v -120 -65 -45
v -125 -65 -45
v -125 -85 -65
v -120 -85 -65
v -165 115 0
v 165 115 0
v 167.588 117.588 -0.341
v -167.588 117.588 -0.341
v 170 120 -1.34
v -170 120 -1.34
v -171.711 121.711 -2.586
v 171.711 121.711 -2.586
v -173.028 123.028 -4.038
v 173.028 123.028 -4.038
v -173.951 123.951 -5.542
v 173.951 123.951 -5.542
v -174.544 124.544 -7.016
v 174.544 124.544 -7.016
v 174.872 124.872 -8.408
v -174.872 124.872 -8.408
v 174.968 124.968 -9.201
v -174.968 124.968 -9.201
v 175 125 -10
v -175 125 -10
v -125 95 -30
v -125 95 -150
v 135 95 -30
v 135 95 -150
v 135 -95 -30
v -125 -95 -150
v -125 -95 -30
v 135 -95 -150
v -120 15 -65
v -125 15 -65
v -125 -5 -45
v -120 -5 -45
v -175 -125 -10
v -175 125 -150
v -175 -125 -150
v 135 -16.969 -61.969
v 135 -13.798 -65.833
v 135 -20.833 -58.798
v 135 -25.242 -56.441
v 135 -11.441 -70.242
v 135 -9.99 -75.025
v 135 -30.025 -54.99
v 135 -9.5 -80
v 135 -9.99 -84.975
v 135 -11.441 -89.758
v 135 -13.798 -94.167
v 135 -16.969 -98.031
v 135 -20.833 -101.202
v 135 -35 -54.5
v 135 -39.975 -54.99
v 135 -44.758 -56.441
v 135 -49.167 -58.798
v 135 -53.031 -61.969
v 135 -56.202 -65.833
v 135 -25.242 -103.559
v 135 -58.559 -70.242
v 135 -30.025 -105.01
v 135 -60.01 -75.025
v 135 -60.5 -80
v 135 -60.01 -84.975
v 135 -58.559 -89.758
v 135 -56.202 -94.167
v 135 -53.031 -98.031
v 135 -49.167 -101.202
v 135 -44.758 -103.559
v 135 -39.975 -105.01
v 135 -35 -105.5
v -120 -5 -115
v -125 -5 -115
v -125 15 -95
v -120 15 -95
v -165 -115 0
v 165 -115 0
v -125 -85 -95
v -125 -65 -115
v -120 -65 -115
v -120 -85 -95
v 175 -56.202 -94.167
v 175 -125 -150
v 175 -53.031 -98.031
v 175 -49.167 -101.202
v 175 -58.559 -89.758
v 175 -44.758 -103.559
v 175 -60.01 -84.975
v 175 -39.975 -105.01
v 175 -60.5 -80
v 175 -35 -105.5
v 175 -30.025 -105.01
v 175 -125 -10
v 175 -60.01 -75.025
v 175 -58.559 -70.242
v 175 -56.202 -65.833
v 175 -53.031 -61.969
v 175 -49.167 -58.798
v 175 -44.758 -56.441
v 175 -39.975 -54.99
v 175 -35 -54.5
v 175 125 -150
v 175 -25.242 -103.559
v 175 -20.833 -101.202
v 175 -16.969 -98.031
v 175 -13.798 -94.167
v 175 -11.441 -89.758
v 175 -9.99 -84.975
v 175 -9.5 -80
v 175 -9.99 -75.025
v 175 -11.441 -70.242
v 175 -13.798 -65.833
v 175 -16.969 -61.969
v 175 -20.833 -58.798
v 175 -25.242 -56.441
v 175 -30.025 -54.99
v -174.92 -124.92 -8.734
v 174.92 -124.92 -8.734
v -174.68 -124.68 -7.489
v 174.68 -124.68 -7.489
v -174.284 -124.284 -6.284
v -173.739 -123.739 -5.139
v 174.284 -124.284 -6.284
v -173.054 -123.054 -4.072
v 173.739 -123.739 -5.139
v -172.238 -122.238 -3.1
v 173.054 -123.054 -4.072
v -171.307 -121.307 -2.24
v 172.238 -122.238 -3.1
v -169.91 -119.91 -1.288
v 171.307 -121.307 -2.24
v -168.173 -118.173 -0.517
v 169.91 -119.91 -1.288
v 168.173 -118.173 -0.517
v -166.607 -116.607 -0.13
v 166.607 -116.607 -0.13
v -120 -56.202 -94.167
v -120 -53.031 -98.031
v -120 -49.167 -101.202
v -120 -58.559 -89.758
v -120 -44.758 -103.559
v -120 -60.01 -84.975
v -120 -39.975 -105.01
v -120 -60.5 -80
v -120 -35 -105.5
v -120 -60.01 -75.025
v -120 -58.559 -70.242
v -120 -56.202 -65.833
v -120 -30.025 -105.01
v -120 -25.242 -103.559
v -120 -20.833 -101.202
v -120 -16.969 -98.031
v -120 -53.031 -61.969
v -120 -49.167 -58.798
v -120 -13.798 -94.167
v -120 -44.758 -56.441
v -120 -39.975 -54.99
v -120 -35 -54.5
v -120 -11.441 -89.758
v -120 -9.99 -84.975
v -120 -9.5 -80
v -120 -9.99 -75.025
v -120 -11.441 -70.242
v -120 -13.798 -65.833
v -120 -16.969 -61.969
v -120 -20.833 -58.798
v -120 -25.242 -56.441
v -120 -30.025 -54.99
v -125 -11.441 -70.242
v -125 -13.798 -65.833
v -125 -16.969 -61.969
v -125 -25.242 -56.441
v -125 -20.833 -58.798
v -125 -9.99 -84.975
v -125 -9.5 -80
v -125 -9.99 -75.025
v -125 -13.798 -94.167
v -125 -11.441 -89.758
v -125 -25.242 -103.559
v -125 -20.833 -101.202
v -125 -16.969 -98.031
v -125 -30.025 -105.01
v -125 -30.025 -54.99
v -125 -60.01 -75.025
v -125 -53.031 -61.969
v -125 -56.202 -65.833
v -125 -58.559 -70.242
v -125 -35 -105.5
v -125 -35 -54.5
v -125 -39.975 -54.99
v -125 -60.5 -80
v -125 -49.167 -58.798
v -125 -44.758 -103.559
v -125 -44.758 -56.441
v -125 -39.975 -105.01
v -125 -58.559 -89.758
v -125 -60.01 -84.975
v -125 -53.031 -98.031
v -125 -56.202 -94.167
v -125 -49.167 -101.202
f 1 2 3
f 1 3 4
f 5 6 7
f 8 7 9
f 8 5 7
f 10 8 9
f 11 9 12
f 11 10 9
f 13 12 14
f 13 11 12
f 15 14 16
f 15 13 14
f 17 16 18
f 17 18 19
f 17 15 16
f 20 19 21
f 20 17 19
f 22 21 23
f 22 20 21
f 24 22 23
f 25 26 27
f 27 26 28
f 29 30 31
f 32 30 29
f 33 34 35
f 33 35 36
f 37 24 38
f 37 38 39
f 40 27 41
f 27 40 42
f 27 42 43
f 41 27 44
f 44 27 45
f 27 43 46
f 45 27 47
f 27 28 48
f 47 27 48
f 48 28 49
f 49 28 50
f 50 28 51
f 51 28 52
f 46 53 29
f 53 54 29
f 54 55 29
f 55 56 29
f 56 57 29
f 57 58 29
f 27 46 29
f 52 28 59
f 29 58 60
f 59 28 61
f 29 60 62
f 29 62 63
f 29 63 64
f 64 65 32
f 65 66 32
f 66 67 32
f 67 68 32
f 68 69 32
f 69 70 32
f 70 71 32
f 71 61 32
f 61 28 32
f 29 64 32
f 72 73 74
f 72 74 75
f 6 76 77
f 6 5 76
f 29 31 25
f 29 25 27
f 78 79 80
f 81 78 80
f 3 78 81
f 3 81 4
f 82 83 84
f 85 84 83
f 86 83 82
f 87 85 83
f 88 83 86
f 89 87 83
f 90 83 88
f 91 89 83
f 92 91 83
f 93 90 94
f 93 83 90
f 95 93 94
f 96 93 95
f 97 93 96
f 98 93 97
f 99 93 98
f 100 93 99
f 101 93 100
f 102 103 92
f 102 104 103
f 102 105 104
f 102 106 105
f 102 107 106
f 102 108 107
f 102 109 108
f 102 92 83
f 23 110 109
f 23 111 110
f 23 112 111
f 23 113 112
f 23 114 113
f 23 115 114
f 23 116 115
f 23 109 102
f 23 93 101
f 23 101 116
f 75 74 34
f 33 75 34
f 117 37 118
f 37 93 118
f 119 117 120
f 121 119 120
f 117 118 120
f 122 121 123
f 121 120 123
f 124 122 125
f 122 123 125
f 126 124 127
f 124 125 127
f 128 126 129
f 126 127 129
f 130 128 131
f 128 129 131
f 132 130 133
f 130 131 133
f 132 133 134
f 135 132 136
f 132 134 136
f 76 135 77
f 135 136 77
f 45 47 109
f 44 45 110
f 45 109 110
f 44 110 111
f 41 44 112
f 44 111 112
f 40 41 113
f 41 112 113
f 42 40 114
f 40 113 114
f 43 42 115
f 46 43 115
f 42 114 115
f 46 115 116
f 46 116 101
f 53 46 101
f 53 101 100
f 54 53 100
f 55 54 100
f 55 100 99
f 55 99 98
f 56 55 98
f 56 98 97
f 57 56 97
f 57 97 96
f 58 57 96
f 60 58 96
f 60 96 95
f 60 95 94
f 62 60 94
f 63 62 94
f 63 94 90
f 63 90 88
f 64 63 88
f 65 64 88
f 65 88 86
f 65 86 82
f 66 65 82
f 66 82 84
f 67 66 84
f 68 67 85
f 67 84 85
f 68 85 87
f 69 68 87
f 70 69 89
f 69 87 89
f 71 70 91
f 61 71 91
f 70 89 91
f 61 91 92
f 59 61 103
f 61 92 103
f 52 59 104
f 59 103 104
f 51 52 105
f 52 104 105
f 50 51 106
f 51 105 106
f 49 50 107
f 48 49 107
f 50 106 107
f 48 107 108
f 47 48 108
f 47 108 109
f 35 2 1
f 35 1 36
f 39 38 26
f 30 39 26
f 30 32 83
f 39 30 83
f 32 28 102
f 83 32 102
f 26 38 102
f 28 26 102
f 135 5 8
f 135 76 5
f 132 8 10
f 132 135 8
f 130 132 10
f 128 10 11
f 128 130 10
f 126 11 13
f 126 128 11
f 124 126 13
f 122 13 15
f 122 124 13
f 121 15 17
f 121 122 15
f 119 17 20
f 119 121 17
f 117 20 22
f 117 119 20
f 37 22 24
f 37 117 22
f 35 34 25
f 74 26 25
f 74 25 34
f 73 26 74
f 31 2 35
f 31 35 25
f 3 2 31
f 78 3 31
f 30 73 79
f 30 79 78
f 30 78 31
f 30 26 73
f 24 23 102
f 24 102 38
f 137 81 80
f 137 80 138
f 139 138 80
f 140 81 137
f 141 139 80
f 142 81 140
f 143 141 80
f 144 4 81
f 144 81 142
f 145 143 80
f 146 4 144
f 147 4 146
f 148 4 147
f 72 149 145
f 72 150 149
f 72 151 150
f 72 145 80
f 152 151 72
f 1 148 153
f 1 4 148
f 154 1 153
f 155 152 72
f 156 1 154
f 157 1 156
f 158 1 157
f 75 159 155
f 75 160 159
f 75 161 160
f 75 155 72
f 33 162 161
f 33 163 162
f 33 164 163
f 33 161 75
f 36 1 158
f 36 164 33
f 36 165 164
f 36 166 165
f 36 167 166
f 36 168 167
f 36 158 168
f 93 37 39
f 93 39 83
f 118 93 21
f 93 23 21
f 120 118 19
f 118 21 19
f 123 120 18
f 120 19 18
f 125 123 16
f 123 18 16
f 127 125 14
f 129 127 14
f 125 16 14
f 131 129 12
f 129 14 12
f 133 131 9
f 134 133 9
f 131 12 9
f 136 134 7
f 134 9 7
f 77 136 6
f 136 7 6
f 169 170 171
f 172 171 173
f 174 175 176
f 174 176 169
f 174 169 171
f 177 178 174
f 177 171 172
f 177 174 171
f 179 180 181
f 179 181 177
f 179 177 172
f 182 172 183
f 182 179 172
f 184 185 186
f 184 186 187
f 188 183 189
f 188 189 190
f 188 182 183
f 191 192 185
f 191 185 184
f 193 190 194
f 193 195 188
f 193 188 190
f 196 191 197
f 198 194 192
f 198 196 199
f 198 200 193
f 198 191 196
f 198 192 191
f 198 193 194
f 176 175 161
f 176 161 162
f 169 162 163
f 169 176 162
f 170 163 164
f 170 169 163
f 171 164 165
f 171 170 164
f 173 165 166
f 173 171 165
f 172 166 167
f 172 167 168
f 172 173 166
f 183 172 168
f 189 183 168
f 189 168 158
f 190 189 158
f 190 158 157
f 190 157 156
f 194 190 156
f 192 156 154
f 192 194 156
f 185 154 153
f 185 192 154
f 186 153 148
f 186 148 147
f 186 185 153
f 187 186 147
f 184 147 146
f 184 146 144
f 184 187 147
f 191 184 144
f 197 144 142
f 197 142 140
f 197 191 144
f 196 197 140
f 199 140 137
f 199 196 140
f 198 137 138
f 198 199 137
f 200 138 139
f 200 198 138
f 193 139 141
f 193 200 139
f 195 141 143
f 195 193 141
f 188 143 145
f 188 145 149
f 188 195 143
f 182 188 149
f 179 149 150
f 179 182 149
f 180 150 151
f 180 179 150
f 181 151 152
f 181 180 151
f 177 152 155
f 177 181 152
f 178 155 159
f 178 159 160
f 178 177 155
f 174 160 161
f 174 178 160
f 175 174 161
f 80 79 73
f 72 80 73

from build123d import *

# Parameters (mm, degrees)
F2_DEPTH = 150
F3_W     = 260
F3_H     = 190
F4_DEPTH = 120
F5_R     = 25.5
F6_DEPTH = 300
F7_R     = 10
F8_W     = 100
F8_H     = 70
F8_R     = 25.5
F9_DEPTH = 5
F10_SIZE = 20


with BuildPart() as f2:
    # F1 (on Top) → F2 (new body)
    with BuildSketch(Plane.XY):
        Polygon((173, -125), (175, -125), (175, 125), (-175, 125), (-175, -125), align=None)
    extrude(amount=-F2_DEPTH)

    # F3 (on face) → F4 (cut)
    with BuildSketch(Plane(origin=(0, 0, -150), x_dir=(1, 0, 0), z_dir=(0, 0, -1))):
        with Locations((5, 0)):
            Rectangle(F3_W, F3_H)
    extrude(amount=-F4_DEPTH, mode=Mode.SUBTRACT)

    # F5 (on face) → F6 (cut, through all)
    with BuildSketch(Plane.YZ.offset(175)):
        with Locations((-35, -80)):
            Circle(F5_R)
    extrude(amount=-F6_DEPTH, mode=Mode.SUBTRACT)

    # F7
    f7_edges = [f2.edges().sort_by_distance(p)[0] for p in [
        (0, -125, 0),
        (-175, 0, 0),
        (0, 125, 0),
        (175, 0, 0),
    ]]
    fillet(f7_edges, radius=F7_R)

    # F8 (on face) → F9 (join)
    with BuildSketch(Plane.YZ.offset(-125)):
        with Locations((-35, -80)):
            Rectangle(F8_W, F8_H)
        with Locations((-35, -80)):
            Circle(F8_R, mode=Mode.SUBTRACT)
    extrude(amount=F9_DEPTH)

    # F10
    f10_edges = [f2.edges().sort_by_distance(p)[0] for p in [
        (-122.5, -85, -115),
        (-122.5, -85, -45),
        (-122.5, 15, -115),
        (-122.5, 15, -45),
    ]]
    chamfer(f10_edges, length=F10_SIZE)


solid = f2.part
